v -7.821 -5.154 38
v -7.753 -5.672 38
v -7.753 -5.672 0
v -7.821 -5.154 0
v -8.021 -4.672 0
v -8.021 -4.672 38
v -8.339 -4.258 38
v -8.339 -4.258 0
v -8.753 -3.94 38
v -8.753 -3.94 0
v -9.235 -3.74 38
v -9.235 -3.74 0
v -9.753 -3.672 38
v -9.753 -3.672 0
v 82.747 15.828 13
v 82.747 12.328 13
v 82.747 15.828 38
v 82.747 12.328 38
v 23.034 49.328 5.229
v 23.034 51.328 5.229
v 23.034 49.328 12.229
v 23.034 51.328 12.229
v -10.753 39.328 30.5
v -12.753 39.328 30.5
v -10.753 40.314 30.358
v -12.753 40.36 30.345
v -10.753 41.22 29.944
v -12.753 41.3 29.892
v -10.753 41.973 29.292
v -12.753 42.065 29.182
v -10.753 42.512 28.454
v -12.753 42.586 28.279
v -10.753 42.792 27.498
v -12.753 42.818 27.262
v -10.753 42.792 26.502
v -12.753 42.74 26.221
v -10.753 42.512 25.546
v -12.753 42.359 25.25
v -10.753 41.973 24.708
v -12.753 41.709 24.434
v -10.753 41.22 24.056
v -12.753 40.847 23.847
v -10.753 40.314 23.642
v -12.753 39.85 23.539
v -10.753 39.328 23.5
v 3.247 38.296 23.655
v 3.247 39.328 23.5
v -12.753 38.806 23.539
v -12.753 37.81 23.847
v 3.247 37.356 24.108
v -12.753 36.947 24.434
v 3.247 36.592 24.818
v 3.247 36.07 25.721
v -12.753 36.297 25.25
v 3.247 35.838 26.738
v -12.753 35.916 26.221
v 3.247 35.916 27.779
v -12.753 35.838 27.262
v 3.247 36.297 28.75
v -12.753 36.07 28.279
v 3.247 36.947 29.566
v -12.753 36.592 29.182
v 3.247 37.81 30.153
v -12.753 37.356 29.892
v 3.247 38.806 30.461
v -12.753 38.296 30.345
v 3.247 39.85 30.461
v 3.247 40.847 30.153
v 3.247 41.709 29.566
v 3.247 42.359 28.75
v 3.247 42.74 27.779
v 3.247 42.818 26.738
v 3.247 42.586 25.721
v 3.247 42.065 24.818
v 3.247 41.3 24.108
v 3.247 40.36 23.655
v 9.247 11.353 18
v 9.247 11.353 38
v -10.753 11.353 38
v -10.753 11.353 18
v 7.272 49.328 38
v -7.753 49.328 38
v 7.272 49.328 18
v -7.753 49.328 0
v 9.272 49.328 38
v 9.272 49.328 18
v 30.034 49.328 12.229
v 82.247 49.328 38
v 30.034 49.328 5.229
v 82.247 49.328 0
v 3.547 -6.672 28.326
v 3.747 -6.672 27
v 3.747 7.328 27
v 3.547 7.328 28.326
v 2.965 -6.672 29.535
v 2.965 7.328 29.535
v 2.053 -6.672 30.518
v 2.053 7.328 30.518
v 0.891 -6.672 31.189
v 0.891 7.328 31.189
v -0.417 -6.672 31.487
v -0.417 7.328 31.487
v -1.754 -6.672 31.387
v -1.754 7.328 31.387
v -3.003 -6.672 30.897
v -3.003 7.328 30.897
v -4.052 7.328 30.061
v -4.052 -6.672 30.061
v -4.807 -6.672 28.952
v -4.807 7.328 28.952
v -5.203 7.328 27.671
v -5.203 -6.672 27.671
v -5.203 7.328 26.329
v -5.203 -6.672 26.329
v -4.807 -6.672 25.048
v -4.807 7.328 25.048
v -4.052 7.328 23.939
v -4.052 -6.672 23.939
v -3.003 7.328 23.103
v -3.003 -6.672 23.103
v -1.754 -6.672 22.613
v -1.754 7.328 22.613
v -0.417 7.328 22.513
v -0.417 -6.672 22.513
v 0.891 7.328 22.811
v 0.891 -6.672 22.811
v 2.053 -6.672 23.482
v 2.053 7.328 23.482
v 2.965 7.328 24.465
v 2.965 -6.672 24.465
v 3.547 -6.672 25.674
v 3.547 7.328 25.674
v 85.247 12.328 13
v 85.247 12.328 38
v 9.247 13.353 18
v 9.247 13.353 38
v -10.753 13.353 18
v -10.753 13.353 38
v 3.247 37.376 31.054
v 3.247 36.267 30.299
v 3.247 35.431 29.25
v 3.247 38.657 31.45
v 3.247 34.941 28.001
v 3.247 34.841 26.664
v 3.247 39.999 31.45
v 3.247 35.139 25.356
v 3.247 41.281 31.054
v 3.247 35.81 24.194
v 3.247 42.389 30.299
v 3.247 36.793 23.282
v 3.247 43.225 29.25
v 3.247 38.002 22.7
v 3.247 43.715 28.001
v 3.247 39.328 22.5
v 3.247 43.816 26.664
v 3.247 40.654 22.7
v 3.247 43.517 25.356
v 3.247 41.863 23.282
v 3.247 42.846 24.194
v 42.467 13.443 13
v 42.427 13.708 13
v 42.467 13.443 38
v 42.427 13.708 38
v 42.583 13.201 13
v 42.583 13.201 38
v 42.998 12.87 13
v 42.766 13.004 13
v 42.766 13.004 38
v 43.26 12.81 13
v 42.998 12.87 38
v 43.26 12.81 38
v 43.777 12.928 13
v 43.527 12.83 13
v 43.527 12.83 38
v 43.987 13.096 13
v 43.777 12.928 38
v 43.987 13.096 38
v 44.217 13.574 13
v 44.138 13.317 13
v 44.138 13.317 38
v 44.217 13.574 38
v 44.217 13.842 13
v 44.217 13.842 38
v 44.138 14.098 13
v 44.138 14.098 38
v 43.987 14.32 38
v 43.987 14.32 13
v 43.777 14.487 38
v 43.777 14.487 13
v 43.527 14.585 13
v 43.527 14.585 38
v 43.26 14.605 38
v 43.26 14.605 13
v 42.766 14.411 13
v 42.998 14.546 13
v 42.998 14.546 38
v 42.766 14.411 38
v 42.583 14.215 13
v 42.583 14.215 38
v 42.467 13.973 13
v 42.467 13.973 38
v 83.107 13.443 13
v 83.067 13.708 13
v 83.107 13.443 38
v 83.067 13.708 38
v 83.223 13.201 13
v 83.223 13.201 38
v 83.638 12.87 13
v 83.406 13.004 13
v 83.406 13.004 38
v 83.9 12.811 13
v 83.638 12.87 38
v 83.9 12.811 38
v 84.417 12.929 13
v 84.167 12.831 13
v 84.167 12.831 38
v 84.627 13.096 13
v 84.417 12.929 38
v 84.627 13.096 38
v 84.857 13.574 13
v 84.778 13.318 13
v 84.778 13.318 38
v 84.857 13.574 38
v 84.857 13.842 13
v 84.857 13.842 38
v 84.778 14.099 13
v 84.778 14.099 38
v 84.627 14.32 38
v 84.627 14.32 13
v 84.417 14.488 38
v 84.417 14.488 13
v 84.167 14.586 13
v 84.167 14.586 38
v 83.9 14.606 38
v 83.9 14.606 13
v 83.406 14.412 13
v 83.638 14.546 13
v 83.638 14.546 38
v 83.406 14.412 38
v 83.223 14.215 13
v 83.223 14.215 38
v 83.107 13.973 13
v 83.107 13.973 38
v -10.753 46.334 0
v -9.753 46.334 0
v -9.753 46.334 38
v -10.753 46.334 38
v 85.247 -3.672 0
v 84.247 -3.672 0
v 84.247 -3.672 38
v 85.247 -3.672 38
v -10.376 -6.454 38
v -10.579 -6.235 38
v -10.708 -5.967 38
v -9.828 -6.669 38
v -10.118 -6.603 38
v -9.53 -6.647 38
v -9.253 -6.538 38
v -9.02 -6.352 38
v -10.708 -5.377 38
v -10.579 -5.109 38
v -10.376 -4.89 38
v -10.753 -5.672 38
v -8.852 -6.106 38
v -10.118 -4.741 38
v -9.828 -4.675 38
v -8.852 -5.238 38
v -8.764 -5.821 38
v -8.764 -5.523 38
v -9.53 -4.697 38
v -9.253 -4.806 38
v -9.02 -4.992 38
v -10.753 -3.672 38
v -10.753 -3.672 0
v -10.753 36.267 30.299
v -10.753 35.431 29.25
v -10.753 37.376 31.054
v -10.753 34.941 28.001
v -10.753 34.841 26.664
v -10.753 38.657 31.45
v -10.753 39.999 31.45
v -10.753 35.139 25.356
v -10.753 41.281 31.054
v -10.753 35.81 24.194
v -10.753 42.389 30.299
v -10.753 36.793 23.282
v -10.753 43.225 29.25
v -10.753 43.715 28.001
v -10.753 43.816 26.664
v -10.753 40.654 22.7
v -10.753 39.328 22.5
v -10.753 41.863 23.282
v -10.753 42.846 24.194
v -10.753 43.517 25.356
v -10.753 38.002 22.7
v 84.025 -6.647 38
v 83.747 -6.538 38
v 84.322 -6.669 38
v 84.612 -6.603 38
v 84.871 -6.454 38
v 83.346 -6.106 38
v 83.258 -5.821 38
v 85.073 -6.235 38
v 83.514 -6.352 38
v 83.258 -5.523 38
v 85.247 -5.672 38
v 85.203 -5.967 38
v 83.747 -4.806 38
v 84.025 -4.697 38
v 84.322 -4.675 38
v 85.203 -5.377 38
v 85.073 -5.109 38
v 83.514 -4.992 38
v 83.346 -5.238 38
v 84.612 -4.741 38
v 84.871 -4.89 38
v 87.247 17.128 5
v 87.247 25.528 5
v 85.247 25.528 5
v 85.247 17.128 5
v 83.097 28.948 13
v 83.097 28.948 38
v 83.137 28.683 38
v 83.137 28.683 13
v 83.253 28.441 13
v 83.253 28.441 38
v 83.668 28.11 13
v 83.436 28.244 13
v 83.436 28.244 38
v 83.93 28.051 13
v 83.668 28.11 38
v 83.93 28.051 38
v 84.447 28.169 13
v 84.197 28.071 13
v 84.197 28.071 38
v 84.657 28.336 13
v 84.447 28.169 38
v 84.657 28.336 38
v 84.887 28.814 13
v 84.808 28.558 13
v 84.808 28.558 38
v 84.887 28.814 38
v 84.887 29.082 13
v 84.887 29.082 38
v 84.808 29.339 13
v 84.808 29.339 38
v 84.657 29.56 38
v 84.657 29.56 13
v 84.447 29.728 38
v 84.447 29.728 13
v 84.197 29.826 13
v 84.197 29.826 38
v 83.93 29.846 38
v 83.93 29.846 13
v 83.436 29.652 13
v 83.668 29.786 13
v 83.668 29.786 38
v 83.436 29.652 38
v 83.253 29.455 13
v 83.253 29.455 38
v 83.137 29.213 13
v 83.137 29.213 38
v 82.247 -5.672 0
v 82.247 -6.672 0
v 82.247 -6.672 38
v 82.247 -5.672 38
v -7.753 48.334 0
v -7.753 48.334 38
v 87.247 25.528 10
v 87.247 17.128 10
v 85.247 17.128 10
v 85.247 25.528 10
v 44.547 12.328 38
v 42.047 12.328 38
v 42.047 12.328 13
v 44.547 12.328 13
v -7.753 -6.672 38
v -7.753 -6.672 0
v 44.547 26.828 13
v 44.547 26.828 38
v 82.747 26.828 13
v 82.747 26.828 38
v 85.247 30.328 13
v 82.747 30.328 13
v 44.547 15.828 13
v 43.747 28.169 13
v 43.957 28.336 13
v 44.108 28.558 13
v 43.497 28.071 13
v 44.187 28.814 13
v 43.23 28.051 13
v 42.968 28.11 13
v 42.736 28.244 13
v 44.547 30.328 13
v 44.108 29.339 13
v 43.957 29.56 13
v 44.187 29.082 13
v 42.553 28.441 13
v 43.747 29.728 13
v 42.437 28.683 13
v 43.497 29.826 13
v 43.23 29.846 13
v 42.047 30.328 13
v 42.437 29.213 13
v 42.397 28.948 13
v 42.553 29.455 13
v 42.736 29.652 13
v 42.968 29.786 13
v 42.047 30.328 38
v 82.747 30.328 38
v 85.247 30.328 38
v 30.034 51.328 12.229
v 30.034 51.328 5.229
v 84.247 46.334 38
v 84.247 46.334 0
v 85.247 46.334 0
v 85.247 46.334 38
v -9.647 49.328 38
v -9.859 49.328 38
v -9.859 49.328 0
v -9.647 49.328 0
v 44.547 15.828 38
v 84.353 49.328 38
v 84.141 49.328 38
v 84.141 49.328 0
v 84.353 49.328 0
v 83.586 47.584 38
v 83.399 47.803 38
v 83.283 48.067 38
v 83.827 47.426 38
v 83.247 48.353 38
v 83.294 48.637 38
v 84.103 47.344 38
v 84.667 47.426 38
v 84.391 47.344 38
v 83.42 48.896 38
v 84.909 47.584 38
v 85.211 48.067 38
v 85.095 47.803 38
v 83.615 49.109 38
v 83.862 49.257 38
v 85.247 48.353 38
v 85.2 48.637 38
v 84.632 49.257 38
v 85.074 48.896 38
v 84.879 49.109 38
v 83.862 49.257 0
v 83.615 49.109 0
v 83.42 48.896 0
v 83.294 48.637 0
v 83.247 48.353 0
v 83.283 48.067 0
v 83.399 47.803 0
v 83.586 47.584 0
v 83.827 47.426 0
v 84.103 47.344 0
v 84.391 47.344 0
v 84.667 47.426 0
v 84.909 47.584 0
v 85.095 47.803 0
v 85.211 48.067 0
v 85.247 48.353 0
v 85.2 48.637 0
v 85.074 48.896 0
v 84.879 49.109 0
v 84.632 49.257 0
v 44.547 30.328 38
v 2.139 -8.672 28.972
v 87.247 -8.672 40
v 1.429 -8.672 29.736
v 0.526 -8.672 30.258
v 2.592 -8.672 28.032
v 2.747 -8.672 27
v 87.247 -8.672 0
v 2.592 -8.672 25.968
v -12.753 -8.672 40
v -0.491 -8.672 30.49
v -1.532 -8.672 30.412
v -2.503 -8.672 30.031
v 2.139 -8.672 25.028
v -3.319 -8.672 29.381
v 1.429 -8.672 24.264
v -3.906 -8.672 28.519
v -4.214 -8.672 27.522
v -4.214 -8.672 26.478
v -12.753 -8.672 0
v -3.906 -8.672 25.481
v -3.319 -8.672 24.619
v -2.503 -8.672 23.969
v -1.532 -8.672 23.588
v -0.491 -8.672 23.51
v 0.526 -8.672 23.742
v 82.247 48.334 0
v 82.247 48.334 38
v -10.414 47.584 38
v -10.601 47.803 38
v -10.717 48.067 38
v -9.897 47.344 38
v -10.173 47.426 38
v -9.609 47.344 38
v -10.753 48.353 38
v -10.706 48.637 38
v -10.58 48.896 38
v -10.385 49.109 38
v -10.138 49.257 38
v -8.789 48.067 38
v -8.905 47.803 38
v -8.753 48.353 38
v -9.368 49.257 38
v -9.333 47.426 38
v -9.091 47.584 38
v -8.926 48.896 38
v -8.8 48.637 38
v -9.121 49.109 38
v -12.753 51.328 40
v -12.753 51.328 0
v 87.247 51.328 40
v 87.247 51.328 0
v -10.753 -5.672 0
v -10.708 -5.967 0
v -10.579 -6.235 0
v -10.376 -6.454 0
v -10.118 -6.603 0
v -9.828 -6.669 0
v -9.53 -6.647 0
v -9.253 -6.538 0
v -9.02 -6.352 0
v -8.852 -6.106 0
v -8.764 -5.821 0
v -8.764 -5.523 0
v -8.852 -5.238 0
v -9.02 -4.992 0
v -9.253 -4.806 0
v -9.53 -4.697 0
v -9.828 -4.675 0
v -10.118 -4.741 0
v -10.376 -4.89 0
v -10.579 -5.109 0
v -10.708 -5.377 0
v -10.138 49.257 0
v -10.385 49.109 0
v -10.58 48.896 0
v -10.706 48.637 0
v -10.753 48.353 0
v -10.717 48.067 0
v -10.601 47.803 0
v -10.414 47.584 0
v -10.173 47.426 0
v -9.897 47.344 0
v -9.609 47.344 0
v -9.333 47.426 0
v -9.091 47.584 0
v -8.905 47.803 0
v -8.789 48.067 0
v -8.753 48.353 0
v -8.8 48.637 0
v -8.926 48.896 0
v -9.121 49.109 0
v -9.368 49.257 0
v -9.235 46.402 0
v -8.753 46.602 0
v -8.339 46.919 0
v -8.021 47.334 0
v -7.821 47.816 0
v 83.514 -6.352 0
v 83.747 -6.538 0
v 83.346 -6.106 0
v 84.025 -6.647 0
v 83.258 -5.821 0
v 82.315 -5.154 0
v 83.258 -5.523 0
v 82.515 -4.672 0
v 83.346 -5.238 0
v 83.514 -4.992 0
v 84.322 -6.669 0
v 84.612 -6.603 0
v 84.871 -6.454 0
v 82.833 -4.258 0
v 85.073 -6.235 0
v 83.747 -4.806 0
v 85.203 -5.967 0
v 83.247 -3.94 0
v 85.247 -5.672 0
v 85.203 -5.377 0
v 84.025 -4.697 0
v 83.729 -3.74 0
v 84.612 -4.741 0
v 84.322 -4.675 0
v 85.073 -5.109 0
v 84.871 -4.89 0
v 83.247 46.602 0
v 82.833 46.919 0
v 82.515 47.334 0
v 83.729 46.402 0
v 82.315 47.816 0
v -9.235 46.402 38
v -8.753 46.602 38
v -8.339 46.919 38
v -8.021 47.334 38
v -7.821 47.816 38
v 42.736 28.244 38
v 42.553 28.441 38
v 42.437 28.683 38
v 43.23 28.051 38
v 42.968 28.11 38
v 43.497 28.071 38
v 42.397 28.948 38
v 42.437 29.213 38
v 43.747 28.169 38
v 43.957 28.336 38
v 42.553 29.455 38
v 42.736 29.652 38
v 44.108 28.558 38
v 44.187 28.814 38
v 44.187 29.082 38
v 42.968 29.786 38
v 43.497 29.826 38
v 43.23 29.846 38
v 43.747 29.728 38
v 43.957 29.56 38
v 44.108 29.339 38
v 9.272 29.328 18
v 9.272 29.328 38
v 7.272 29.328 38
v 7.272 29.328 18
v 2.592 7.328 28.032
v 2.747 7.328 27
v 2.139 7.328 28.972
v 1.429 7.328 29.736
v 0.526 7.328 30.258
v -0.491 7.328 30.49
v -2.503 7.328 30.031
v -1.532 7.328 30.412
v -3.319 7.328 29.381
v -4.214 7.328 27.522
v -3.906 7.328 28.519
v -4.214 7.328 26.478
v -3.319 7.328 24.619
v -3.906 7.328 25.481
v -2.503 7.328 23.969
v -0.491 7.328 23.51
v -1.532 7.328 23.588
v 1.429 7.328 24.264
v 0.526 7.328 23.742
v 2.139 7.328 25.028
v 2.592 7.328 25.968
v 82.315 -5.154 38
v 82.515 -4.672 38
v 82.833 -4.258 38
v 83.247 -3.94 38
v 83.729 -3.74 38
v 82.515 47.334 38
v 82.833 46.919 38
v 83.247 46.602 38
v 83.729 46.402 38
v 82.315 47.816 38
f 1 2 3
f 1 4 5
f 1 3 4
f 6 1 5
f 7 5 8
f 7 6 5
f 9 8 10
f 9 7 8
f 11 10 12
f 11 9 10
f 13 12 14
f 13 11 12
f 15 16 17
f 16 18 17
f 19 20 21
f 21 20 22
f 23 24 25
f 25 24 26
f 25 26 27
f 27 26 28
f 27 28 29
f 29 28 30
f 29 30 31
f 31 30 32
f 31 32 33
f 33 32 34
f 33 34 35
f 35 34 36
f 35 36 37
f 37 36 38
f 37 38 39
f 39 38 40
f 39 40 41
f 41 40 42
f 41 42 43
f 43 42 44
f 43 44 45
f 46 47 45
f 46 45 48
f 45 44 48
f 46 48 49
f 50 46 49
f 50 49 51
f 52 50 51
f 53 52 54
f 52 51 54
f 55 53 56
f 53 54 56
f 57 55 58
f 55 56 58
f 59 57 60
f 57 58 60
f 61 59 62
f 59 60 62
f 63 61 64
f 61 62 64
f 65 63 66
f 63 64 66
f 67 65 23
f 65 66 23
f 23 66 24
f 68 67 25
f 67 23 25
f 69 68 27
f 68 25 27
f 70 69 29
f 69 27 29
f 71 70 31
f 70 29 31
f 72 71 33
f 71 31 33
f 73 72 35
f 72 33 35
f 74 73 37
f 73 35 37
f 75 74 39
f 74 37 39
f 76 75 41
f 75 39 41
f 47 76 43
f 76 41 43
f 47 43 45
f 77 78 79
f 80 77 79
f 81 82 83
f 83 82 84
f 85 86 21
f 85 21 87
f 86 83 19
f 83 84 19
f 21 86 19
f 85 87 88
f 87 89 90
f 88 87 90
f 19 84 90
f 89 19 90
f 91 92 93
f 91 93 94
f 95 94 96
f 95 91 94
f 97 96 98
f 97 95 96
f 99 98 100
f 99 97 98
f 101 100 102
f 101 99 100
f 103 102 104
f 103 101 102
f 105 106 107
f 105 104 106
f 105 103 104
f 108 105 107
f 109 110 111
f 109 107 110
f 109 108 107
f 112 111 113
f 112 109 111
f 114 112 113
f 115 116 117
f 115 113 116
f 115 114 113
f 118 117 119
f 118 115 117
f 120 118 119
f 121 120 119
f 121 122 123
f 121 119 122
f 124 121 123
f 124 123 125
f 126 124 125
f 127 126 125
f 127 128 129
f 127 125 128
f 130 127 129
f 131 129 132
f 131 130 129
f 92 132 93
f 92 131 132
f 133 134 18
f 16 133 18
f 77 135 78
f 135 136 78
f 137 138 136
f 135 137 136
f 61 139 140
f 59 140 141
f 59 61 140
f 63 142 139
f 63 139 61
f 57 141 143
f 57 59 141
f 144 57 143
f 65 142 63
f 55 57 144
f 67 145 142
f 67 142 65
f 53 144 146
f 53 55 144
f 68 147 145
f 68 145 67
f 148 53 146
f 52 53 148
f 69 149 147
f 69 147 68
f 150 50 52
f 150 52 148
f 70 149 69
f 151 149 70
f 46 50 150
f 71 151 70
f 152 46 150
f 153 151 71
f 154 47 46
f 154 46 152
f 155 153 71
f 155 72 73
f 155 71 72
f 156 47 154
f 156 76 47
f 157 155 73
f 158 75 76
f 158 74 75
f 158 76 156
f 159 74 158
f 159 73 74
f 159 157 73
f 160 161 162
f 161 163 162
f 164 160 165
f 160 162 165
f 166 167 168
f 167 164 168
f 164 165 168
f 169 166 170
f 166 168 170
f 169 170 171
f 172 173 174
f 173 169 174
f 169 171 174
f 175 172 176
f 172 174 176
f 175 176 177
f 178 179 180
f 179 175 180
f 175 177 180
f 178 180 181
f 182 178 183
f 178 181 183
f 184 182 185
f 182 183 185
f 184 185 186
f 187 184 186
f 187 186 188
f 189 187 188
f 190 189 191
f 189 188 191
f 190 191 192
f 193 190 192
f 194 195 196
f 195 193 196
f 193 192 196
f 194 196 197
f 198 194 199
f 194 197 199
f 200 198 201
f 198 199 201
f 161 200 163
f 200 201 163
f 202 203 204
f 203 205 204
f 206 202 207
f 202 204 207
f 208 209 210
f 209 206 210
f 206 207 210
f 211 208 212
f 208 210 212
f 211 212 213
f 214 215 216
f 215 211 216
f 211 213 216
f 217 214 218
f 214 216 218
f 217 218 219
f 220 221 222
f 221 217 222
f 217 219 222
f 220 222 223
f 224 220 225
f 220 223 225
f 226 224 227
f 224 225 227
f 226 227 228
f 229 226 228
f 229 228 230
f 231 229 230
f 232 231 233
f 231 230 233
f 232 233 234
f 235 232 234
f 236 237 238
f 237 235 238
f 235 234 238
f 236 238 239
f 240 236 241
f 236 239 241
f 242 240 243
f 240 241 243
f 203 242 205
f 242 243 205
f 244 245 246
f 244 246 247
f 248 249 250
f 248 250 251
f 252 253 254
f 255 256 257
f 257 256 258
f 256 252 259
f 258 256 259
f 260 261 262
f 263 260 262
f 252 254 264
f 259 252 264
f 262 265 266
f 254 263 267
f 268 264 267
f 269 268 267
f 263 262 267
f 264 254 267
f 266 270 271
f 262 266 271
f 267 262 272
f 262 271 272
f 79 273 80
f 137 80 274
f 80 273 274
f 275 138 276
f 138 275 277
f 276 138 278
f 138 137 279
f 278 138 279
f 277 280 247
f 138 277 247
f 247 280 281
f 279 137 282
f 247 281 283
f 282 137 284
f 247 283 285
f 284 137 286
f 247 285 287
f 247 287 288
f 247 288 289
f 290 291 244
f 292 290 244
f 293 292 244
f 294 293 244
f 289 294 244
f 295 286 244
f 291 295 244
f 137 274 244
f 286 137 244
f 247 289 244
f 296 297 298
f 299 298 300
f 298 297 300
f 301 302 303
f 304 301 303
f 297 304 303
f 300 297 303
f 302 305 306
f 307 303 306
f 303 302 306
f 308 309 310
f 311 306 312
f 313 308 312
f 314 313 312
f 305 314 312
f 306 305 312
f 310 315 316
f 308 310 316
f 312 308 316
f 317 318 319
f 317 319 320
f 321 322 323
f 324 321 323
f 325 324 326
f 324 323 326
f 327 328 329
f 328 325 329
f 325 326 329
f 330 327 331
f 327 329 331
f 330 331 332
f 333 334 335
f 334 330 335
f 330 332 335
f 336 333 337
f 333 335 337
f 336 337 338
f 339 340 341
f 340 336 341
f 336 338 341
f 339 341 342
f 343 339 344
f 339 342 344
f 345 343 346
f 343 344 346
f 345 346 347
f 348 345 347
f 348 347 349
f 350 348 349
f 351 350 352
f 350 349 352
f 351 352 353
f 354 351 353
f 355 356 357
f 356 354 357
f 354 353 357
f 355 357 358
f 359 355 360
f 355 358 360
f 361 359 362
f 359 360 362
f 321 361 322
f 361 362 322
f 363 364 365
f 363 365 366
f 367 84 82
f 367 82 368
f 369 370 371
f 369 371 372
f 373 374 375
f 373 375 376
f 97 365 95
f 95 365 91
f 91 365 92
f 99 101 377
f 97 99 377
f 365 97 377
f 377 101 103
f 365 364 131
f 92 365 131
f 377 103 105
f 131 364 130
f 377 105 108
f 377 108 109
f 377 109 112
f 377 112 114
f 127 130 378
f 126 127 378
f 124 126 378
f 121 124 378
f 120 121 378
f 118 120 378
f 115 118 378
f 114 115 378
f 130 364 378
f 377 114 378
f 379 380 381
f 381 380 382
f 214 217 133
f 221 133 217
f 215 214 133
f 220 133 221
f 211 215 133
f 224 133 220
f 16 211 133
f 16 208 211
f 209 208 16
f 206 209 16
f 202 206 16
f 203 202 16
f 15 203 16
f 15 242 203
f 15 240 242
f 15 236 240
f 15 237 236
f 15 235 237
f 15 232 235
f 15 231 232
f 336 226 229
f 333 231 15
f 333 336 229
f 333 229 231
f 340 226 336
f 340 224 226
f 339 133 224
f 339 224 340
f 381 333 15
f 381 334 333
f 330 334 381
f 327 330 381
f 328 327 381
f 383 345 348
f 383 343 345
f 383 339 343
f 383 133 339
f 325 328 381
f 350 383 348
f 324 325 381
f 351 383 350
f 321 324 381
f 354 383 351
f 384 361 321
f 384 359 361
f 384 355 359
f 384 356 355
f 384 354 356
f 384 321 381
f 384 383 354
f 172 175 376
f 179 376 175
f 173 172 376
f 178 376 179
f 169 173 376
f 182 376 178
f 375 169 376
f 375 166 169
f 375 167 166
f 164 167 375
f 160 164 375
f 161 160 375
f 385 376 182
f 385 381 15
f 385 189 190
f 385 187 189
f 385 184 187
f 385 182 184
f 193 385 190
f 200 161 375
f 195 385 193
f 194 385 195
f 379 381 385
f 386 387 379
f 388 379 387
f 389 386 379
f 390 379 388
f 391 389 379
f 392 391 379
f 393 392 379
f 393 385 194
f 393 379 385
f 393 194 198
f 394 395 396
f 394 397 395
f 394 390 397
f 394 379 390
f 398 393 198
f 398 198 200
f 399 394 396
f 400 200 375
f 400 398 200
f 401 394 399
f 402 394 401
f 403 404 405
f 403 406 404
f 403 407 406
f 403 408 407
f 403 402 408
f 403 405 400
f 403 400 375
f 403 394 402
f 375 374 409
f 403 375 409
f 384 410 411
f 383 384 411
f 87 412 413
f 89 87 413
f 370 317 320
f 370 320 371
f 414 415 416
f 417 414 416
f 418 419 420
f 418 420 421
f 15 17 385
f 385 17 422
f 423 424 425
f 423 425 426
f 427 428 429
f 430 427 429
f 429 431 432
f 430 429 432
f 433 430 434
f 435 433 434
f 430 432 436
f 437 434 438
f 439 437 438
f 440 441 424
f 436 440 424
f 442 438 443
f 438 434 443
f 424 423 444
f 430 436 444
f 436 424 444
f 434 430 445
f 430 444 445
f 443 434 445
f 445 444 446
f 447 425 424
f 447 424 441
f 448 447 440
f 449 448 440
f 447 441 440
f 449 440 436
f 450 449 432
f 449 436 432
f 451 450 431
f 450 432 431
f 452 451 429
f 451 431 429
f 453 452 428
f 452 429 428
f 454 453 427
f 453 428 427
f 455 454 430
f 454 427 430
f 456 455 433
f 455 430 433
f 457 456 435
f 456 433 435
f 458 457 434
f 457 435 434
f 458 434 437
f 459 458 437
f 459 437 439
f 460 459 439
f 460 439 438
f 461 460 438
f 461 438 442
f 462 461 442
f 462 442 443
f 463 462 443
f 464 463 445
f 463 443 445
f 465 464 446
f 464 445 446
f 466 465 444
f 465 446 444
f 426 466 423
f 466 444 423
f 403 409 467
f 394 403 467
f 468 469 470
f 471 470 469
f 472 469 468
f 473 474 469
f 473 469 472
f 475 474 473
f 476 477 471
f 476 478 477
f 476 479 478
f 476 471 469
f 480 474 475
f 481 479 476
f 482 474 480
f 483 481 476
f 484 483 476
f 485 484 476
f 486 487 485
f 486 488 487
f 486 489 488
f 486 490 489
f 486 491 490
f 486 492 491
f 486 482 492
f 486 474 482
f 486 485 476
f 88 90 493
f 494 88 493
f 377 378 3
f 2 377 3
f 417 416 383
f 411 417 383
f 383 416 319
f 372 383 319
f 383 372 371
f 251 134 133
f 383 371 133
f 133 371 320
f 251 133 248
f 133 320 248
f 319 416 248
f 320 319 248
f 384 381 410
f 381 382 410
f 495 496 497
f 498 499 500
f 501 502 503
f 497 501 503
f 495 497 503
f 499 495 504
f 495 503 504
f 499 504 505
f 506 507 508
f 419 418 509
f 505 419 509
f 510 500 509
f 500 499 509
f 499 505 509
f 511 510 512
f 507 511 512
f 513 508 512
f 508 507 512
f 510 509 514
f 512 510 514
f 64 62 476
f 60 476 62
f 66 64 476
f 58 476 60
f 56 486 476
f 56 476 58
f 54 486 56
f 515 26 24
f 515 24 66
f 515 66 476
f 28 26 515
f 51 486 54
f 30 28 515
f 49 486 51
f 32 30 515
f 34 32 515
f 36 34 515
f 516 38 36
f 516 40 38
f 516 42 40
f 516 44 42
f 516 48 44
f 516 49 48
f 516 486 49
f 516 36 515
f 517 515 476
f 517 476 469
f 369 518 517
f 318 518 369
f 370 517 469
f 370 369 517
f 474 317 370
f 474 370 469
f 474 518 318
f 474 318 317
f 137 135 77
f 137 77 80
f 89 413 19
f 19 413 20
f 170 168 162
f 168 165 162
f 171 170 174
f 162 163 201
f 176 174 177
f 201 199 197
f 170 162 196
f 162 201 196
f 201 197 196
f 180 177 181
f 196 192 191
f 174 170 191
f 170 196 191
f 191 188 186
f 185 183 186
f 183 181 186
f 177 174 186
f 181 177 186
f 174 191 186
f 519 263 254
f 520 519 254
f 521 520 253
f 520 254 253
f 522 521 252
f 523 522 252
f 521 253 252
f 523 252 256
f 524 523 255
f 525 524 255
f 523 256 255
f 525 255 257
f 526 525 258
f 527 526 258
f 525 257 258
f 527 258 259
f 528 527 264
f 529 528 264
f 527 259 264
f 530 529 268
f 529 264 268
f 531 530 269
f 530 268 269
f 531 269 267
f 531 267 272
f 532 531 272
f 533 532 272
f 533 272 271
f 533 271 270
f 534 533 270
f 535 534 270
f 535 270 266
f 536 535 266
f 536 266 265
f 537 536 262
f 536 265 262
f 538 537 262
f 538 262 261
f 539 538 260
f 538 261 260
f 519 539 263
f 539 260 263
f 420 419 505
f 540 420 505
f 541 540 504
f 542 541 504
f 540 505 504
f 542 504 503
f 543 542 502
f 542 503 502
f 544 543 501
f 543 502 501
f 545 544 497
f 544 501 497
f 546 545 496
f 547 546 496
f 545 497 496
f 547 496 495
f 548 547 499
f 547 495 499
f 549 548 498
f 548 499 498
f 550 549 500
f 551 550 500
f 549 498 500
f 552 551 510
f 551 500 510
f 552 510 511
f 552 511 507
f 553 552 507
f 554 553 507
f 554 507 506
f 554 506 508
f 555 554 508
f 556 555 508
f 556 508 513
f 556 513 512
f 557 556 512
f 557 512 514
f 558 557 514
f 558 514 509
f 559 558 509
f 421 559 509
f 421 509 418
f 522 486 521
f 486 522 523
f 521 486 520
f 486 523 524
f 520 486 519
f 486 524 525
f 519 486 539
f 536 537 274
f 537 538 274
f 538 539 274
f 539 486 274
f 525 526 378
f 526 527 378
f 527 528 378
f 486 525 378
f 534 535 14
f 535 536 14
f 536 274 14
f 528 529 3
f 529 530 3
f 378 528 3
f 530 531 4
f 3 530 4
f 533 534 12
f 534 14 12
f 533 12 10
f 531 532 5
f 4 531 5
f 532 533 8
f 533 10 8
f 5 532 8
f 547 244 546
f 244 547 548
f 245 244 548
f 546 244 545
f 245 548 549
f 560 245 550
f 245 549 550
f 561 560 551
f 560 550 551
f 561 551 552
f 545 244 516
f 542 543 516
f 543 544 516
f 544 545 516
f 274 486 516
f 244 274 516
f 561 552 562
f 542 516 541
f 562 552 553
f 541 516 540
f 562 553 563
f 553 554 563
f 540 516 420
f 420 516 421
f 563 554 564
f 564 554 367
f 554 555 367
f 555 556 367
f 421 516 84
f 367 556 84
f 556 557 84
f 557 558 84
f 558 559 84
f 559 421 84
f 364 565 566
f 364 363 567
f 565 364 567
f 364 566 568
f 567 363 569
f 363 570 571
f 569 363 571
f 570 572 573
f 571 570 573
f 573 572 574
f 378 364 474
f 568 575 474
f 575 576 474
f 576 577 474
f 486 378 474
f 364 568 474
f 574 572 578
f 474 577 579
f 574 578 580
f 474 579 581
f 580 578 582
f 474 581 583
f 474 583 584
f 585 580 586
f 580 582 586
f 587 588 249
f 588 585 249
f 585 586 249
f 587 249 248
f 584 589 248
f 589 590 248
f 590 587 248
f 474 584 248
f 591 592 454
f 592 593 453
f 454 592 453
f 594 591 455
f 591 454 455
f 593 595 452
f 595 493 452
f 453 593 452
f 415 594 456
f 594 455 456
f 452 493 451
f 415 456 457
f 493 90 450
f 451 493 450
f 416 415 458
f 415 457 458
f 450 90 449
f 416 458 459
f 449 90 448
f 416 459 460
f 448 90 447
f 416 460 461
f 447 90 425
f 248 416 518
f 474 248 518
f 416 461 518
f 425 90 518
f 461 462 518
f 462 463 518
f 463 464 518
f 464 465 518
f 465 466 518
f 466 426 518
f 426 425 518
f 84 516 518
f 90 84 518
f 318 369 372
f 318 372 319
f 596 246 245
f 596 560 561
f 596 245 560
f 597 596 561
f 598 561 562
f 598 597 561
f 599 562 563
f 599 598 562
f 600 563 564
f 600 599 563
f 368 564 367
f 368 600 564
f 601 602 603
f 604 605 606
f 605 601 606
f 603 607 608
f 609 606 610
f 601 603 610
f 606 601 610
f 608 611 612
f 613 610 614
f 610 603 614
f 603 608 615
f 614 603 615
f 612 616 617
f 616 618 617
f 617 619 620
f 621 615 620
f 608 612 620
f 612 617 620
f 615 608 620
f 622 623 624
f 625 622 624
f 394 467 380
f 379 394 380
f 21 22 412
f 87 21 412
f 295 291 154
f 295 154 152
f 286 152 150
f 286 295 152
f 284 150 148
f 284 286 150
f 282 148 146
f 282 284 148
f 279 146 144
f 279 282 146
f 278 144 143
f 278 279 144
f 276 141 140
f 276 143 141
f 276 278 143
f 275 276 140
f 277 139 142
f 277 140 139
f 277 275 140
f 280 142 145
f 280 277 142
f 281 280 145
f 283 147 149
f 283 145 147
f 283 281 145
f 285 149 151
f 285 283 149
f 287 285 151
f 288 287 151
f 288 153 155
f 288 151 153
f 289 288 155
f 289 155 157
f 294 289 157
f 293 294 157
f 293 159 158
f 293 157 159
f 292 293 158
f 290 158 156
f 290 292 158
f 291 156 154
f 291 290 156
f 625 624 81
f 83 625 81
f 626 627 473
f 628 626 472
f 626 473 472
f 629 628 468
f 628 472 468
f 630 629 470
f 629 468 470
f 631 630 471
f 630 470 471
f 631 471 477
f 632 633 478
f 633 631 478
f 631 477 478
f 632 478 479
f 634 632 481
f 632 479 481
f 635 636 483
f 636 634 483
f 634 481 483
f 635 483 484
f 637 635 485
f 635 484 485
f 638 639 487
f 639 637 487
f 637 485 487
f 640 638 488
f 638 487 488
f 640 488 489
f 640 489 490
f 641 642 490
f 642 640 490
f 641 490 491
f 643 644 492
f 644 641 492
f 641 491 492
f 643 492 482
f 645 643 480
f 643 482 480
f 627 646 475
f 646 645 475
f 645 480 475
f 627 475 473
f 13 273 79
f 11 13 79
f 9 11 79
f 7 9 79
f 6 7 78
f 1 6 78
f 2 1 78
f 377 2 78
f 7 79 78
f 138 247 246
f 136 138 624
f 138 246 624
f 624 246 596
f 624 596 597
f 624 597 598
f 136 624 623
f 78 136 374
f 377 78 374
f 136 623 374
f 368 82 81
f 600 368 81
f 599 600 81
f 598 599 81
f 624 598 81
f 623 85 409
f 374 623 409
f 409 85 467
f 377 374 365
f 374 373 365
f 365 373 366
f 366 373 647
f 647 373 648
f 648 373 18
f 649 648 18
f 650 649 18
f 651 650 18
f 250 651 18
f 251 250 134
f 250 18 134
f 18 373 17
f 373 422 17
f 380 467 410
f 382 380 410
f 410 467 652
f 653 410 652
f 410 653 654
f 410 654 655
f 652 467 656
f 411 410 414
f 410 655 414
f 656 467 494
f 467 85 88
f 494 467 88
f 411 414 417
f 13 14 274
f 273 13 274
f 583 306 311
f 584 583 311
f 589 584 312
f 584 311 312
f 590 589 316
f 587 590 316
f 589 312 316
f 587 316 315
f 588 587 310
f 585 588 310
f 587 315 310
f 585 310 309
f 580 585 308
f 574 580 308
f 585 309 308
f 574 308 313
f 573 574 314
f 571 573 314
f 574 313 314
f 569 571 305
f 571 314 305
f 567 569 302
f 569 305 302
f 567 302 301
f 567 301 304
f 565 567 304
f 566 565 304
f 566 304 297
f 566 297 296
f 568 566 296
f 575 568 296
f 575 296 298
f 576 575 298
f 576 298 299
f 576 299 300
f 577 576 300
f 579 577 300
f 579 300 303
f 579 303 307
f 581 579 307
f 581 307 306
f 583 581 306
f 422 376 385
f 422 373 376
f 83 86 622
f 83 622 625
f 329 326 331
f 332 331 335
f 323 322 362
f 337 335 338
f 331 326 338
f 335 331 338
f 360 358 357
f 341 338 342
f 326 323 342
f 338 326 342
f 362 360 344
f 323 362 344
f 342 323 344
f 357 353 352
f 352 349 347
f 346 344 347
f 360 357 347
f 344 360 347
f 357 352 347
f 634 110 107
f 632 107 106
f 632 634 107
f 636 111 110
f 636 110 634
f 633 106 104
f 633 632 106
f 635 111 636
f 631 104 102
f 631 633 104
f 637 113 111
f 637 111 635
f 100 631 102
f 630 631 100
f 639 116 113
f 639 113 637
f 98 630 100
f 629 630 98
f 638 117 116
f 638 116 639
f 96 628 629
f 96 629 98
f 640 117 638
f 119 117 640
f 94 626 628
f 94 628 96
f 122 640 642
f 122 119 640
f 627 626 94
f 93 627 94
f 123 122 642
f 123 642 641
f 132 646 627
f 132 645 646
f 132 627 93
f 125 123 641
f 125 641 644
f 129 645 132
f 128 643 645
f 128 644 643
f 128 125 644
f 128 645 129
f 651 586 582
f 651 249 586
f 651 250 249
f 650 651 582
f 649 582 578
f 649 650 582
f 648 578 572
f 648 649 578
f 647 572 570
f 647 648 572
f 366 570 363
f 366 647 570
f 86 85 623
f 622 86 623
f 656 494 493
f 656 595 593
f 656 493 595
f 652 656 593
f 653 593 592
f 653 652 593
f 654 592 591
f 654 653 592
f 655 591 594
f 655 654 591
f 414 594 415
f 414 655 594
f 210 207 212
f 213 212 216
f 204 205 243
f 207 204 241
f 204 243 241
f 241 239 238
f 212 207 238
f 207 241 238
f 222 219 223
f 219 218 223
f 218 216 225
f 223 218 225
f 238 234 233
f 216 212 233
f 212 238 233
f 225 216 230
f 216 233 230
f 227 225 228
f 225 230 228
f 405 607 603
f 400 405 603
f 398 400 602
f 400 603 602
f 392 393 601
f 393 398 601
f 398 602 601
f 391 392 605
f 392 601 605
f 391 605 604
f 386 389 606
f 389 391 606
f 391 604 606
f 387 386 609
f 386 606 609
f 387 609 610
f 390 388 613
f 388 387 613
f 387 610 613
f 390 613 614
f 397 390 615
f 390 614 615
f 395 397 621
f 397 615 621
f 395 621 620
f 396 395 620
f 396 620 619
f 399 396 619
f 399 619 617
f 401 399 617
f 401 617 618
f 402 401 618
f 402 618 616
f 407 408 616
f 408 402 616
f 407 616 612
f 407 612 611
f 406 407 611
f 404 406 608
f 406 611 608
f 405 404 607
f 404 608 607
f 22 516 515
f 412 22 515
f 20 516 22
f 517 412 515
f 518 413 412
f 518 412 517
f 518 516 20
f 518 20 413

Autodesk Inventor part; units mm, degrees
ref_plane "YZ Plane" through (0, 0, 0) normal (1, 0, 0) x (0, 1, 0)
ref_plane "XZ Plane" through (0, 0, 0) normal (0, 1, 0) x (-1, 0, 0)
ref_plane "XY Plane" through (0, 0, 0) normal (0, 0, 1) x (1, 0, 0)
sketch "Sketch1" plane through (0, 0, 0) normal (0, 0, 1) x (1, 0, 0)
  line L0 (-12.7529, 51.3281) -> (87.2471, 51.3281)
  line L1 (87.2471, 51.3281) -> (87.2471, -8.6719)
  line L2 (87.2471, -8.6719) -> (-12.7529, -8.6719)
  line L3 (-12.7529, -8.6719) -> (-12.7529, 51.3281)
  point P0 (0, 0)
  dimension "d0" = 100
  dimension "d1" = 60
extrude "Extrusion1" add sketch "Sketch1" along normal blind 40
shell "Shell1" thickness 2 removed faces 1 at (20.5805, 31.3281, 0)
sketch "Sketch2" plane through (85.2471, -6.6719, 38) normal (0, 0, -1) x (-1, 0, 0)
  line L0 (0, 0) -> (0, 56) projected
  line L1 (43.2, 19) -> (43.2, 37)
  line L2 (0, 37) -> (0, 19)
  line L3 (43.2, 19) -> (40.7, 19)
  line L4 (40.7, 19) -> (40.7, 22.5)
  line L5 (0, 16.6053) -> (0, 19)
  line L6 (0, 19) -> (2.5, 19)
  line L7 (2.5, 19) -> (2.5, 22.5)
  line L8 (2.5, 22.5) -> (40.7, 22.5)
  line L9 (0, 19) -> (2.5, 19)
  line L10 (40.7, 19) -> (43.2, 19)
  line L11 (43.2, 37) -> (40.7, 37)
  line L12 (40.7, 37) -> (40.7, 33.5)
  line L13 (40.7, 33.5) -> (2.5, 33.5)
  line L14 (2.5, 33.5) -> (2.5, 37)
  line L15 (43.2, 37) -> (40.7, 37)
  line L16 (2.5, 37) -> (0, 37)
  line L17 (96, 0) -> (0, 0) projected
  circle A0 centre (41.92, 20.3797) radius 0.9
  circle A1 centre (41.95, 35.62) radius 0.9
  circle A2 centre (1.28, 20.38) radius 0.9
  circle A3 centre (1.25, 35.62) radius 0.9
  line L18 (0, 56) -> (96, 56) projected
  point P0 (85.2471, 6.6719)
  point P1 (1.25, 19)
  point P2 (41.95, 19)
  point P3 (0, 37)
  point P4 (1.25, 37)
  point P5 (1.25, 19)
  dimension "d5" = 43.2
  dimension "d6" = 18
  dimension "d7" = 2.5
  dimension "d8" = 3.5
  dimension "d9" = 2.5
  dimension "d10" = 3.5
  dimension "d12" = 3.5
  dimension "d13" = 1.8
  dimension "d14" = 1.38
  dimension "d15" = 1.28
  dimension "d16" = 1.8
  dimension "d17" = 1.8
  dimension "d18" = 1.8
  dimension "d19" = 1.38
  dimension "d20" = 1.28
  dimension "d29" = 1.38
  dimension "d30" = 1.25
  dimension "d31" = 3.5
  dimension "d32" = 19
  dimension "d33" = 1.38
extrude "Extrusion2" add sketch "Sketch2" along normal blind 25
sketch "Sketch5" plane through (85.2471, -6.6719, 38) normal (0, 0, -1) x (-1, 0, 0)
  line L0 (0, 56) -> (96, 56) projected
  line L1 (77.9752, 56) -> (75.9752, 56)
  line L2 (75.9752, 56) -> (75.9752, 36)
  line L3 (75.9752, 36) -> (77.9752, 36)
  line L4 (77.9752, 36) -> (77.9752, 56)
  point P0 (85.2471, 6.6719)
  point P1 (75.9752, 56)
  dimension "d40" = 20
  dimension "d41" = 2
extrude "Extrusion5" add sketch "Sketch5" along normal blind 20
sketch "Sketch6" plane through (-12.7529, -8.6719, 0) normal (-1, 0, 0) x (0, 0, 1)
  circle A0 centre (27, 48) radius 3.5
  line L0 (18, 58) -> (18, 31.1645)
  line L1 (13, 23.2797) -> (38, 23.2797) projected
  line L2 (0, 58) -> (38, 58) projected
  point P0 (0, 8.6719)
  point P1 (18, 44.5822)
  dimension "d44" = 7
  dimension "d45" = 9
  dimension "d46" = 10
extrude "Extrusion6" cut sketch "Sketch6" against normal blind 4
sketch "Sketch7" plane through (-10.7529, -6.6719, 0) normal (1, 0, 0) x (0, 0, -1)
  circle A0 centre (-27, 46) radius 4.5
  line L0 (-40, -2) -> (-40, 58) projected
  circle A1 centre (-27, 46) radius 3.5
  line L1 (0, 56) -> (-38, 56) projected
  point P0 (0, 6.6719)
  dimension "d49" = 9
  dimension "d50" = 13
  dimension "d51" = 7
  dimension "d52" = 10
extrude "Extrusion7" add sketch "Sketch7" along normal blind 14
sketch "Sketch8" plane through (85.2471, -6.6719, 38) normal (0, 0, -1) x (-1, 0, 0)
  line L0 (96, 56) -> (96, 0) projected
  line L1 (96, 20.025) -> (76, 20.025)
  line L2 (76, 20.025) -> (76, 18.025)
  line L3 (76, 18.025) -> (96, 18.025)
  line L4 (96, 18.025) -> (96, 20.025)
  line L5 (96, 0) -> (0, 0) projected
  point P0 (85.2471, 6.6719)
  dimension "d55" = 20
  dimension "d56" = 2
  dimension "d57" = 18.025
extrude "Extrusion8" add sketch "Sketch8" along normal blind 20
sketch "Sketch9" plane through (-12.7529, -8.6719, 0) normal (0, -1, 0) x (1, 0, 0)
  circle A0 centre (12, 27) radius 3.5
  line L0 (0, 40) -> (100, 40) projected
  line L1 (2, 0) -> (2, 38) projected
  point P0 (12.7529, 0)
  dimension "d60" = 7
  dimension "d61" = 13
  dimension "d62" = 10
extrude "Extrusion9" cut sketch "Sketch9" against normal blind 4
sketch "Sketch10" plane through (-10.7529, -6.6719, 0) normal (0, 1, 0) x (1, 0, 0)
  circle A0 centre (10, -27) radius 3.5
  line L0 (98, -40) -> (-2, -40) projected
  line L1 (-2, 0) -> (-2, -40) projected
  circle A1 centre (10, -27) radius 4.5
  point P0 (10.7529, 0)
  dimension "d65" = 7
  dimension "d66" = 13
  dimension "d67" = 12
  dimension "d68" = 9
extrude "Extrusion10" add sketch "Sketch10" along normal blind 14
sketch "Sketch11" plane through (87.2471, -8.6719, 0) normal (1, 0, 0) x (0, 0, -1)
  line L0 (-5, 25.8) -> (-10, 25.8)
  line L1 (-10, 25.8) -> (-10, 34.2)
  line L2 (-10, 34.2) -> (-5, 34.2)
  line L3 (-5, 34.2) -> (-5, 25.8)
  line L4 (-40, 0) -> (-40, 60) projected
  line L5 (0, 0) -> (-40, 0) projected
  point P0 (0, 8.6719)
  dimension "d71" = 5
  dimension "d72" = 8.4
  dimension "d73" = 30
  dimension "d74" = 25.8
extrude "Extrusion11" cut sketch "Sketch11" against normal blind 2
sketch "Sketch12" plane through (85.2471, -6.6719, 38) normal (0, 0, -1) x (-1, 0, 0)
  line L0 (96, 0) -> (0, 0) projected
  line L1 (96, 0) -> (93, 0)
  line L2 (93, 0) -> (93, 1)
  line L3 (95, 3) -> (96, 3)
  line L4 (96, 3) -> (96, 0)
  line L5 (96, 56.0056) -> (93, 56.0056)
  line L6 (93, 56.0056) -> (93, 55.0056)
  line L7 (95, 53.0056) -> (96, 53.0056)
  line L8 (96, 53.0056) -> (96, 56.0056)
  line L9 (0, 56.0056) -> (3, 56.0056)
  line L10 (3, 56.0056) -> (3, 55.0056)
  line L11 (1, 53.0056) -> (0, 53.0056)
  line L12 (0, 53.0056) -> (0, 56.0056)
  line L13 (0, 0) -> (3, 0)
  line L14 (3, 0) -> (3, 1)
  line L15 (1, 3) -> (0, 3)
  line L16 (0, 3) -> (0, 0)
  circle A0 centre (95, 55.0056) radius 1
  arc A1 (93, 55.0056) -> (95, 53.0056) centre (95, 55.0056) ccw
  arc A2 (95, 3) -> (93, 1) centre (95, 1) ccw
  arc A3 (1, 53.0056) -> (3, 55.0056) centre (1, 55.0056) ccw
  arc A4 (3, 1) -> (1, 3) centre (1, 1) ccw
  circle A5 centre (95, 1) radius 1
  circle A6 centre (1, 1) radius 1
  circle A7 centre (1, 55.0056) radius 1
  point P0 (85.2471, 6.6719)
  point P1 (93, 3)
  point P2 (93, 53.0056)
  point P3 (3, 53.0056)
  point P4 (3, 3)
  point P5 (0, 1)
  point P6 (1, 0)
  point P7 (3, 0)
  point P8 (1, 56.0056)
  point P9 (0, 55.0056)
  point P10 (95, 56.0056)
  point P11 (96, 55.0056)
  point P12 (96, 1)
  point P13 (95, 0)
  dimension "d77" = 3
  dimension "d78" = 3
  dimension "d79" = 3
  dimension "d80" = 3
  dimension "d81" = 3
  dimension "d82" = 3
  dimension "d83" = 3
  dimension "d84" = 2
  dimension "d85" = 0
  dimension "d86" = 1
  dimension "d87" = 2
  dimension "d88" = 2
  dimension "d89" = 2
  dimension "d90" = 2
extrude "Extrusion12" add sketch "Sketch12" along normal blind 38 contours L0 A6 L16 L15 A4 L14 | L2 A2 L3 L4 A5 L0 | A5 L4 L0 | L0 L16 A6 | L8 A0 L5 | A0 L8 L7 A1 L6 L5 | L9 A7 L12 | L9 L10 A3 L11 L12 A7
sketch "Sketch13" plane through (-12.7529, 51.3281, 0) normal (0, 1, 0) x (1, 0, 0)
  line L0 (35.7867, -12.2294) -> (42.7867, -12.2294)
  line L1 (42.7867, -12.2294) -> (42.7867, -5.2294)
  line L2 (42.7867, -5.2294) -> (35.7867, -5.2294)
  line L3 (35.7867, -5.2294) -> (35.7867, -12.2294)
  point P0 (12.7529, 0)
  dimension "d93" = 7
  dimension "d94" = 7
extrude "Extrusion13" cut sketch "Sketch13" against normal blind 10
